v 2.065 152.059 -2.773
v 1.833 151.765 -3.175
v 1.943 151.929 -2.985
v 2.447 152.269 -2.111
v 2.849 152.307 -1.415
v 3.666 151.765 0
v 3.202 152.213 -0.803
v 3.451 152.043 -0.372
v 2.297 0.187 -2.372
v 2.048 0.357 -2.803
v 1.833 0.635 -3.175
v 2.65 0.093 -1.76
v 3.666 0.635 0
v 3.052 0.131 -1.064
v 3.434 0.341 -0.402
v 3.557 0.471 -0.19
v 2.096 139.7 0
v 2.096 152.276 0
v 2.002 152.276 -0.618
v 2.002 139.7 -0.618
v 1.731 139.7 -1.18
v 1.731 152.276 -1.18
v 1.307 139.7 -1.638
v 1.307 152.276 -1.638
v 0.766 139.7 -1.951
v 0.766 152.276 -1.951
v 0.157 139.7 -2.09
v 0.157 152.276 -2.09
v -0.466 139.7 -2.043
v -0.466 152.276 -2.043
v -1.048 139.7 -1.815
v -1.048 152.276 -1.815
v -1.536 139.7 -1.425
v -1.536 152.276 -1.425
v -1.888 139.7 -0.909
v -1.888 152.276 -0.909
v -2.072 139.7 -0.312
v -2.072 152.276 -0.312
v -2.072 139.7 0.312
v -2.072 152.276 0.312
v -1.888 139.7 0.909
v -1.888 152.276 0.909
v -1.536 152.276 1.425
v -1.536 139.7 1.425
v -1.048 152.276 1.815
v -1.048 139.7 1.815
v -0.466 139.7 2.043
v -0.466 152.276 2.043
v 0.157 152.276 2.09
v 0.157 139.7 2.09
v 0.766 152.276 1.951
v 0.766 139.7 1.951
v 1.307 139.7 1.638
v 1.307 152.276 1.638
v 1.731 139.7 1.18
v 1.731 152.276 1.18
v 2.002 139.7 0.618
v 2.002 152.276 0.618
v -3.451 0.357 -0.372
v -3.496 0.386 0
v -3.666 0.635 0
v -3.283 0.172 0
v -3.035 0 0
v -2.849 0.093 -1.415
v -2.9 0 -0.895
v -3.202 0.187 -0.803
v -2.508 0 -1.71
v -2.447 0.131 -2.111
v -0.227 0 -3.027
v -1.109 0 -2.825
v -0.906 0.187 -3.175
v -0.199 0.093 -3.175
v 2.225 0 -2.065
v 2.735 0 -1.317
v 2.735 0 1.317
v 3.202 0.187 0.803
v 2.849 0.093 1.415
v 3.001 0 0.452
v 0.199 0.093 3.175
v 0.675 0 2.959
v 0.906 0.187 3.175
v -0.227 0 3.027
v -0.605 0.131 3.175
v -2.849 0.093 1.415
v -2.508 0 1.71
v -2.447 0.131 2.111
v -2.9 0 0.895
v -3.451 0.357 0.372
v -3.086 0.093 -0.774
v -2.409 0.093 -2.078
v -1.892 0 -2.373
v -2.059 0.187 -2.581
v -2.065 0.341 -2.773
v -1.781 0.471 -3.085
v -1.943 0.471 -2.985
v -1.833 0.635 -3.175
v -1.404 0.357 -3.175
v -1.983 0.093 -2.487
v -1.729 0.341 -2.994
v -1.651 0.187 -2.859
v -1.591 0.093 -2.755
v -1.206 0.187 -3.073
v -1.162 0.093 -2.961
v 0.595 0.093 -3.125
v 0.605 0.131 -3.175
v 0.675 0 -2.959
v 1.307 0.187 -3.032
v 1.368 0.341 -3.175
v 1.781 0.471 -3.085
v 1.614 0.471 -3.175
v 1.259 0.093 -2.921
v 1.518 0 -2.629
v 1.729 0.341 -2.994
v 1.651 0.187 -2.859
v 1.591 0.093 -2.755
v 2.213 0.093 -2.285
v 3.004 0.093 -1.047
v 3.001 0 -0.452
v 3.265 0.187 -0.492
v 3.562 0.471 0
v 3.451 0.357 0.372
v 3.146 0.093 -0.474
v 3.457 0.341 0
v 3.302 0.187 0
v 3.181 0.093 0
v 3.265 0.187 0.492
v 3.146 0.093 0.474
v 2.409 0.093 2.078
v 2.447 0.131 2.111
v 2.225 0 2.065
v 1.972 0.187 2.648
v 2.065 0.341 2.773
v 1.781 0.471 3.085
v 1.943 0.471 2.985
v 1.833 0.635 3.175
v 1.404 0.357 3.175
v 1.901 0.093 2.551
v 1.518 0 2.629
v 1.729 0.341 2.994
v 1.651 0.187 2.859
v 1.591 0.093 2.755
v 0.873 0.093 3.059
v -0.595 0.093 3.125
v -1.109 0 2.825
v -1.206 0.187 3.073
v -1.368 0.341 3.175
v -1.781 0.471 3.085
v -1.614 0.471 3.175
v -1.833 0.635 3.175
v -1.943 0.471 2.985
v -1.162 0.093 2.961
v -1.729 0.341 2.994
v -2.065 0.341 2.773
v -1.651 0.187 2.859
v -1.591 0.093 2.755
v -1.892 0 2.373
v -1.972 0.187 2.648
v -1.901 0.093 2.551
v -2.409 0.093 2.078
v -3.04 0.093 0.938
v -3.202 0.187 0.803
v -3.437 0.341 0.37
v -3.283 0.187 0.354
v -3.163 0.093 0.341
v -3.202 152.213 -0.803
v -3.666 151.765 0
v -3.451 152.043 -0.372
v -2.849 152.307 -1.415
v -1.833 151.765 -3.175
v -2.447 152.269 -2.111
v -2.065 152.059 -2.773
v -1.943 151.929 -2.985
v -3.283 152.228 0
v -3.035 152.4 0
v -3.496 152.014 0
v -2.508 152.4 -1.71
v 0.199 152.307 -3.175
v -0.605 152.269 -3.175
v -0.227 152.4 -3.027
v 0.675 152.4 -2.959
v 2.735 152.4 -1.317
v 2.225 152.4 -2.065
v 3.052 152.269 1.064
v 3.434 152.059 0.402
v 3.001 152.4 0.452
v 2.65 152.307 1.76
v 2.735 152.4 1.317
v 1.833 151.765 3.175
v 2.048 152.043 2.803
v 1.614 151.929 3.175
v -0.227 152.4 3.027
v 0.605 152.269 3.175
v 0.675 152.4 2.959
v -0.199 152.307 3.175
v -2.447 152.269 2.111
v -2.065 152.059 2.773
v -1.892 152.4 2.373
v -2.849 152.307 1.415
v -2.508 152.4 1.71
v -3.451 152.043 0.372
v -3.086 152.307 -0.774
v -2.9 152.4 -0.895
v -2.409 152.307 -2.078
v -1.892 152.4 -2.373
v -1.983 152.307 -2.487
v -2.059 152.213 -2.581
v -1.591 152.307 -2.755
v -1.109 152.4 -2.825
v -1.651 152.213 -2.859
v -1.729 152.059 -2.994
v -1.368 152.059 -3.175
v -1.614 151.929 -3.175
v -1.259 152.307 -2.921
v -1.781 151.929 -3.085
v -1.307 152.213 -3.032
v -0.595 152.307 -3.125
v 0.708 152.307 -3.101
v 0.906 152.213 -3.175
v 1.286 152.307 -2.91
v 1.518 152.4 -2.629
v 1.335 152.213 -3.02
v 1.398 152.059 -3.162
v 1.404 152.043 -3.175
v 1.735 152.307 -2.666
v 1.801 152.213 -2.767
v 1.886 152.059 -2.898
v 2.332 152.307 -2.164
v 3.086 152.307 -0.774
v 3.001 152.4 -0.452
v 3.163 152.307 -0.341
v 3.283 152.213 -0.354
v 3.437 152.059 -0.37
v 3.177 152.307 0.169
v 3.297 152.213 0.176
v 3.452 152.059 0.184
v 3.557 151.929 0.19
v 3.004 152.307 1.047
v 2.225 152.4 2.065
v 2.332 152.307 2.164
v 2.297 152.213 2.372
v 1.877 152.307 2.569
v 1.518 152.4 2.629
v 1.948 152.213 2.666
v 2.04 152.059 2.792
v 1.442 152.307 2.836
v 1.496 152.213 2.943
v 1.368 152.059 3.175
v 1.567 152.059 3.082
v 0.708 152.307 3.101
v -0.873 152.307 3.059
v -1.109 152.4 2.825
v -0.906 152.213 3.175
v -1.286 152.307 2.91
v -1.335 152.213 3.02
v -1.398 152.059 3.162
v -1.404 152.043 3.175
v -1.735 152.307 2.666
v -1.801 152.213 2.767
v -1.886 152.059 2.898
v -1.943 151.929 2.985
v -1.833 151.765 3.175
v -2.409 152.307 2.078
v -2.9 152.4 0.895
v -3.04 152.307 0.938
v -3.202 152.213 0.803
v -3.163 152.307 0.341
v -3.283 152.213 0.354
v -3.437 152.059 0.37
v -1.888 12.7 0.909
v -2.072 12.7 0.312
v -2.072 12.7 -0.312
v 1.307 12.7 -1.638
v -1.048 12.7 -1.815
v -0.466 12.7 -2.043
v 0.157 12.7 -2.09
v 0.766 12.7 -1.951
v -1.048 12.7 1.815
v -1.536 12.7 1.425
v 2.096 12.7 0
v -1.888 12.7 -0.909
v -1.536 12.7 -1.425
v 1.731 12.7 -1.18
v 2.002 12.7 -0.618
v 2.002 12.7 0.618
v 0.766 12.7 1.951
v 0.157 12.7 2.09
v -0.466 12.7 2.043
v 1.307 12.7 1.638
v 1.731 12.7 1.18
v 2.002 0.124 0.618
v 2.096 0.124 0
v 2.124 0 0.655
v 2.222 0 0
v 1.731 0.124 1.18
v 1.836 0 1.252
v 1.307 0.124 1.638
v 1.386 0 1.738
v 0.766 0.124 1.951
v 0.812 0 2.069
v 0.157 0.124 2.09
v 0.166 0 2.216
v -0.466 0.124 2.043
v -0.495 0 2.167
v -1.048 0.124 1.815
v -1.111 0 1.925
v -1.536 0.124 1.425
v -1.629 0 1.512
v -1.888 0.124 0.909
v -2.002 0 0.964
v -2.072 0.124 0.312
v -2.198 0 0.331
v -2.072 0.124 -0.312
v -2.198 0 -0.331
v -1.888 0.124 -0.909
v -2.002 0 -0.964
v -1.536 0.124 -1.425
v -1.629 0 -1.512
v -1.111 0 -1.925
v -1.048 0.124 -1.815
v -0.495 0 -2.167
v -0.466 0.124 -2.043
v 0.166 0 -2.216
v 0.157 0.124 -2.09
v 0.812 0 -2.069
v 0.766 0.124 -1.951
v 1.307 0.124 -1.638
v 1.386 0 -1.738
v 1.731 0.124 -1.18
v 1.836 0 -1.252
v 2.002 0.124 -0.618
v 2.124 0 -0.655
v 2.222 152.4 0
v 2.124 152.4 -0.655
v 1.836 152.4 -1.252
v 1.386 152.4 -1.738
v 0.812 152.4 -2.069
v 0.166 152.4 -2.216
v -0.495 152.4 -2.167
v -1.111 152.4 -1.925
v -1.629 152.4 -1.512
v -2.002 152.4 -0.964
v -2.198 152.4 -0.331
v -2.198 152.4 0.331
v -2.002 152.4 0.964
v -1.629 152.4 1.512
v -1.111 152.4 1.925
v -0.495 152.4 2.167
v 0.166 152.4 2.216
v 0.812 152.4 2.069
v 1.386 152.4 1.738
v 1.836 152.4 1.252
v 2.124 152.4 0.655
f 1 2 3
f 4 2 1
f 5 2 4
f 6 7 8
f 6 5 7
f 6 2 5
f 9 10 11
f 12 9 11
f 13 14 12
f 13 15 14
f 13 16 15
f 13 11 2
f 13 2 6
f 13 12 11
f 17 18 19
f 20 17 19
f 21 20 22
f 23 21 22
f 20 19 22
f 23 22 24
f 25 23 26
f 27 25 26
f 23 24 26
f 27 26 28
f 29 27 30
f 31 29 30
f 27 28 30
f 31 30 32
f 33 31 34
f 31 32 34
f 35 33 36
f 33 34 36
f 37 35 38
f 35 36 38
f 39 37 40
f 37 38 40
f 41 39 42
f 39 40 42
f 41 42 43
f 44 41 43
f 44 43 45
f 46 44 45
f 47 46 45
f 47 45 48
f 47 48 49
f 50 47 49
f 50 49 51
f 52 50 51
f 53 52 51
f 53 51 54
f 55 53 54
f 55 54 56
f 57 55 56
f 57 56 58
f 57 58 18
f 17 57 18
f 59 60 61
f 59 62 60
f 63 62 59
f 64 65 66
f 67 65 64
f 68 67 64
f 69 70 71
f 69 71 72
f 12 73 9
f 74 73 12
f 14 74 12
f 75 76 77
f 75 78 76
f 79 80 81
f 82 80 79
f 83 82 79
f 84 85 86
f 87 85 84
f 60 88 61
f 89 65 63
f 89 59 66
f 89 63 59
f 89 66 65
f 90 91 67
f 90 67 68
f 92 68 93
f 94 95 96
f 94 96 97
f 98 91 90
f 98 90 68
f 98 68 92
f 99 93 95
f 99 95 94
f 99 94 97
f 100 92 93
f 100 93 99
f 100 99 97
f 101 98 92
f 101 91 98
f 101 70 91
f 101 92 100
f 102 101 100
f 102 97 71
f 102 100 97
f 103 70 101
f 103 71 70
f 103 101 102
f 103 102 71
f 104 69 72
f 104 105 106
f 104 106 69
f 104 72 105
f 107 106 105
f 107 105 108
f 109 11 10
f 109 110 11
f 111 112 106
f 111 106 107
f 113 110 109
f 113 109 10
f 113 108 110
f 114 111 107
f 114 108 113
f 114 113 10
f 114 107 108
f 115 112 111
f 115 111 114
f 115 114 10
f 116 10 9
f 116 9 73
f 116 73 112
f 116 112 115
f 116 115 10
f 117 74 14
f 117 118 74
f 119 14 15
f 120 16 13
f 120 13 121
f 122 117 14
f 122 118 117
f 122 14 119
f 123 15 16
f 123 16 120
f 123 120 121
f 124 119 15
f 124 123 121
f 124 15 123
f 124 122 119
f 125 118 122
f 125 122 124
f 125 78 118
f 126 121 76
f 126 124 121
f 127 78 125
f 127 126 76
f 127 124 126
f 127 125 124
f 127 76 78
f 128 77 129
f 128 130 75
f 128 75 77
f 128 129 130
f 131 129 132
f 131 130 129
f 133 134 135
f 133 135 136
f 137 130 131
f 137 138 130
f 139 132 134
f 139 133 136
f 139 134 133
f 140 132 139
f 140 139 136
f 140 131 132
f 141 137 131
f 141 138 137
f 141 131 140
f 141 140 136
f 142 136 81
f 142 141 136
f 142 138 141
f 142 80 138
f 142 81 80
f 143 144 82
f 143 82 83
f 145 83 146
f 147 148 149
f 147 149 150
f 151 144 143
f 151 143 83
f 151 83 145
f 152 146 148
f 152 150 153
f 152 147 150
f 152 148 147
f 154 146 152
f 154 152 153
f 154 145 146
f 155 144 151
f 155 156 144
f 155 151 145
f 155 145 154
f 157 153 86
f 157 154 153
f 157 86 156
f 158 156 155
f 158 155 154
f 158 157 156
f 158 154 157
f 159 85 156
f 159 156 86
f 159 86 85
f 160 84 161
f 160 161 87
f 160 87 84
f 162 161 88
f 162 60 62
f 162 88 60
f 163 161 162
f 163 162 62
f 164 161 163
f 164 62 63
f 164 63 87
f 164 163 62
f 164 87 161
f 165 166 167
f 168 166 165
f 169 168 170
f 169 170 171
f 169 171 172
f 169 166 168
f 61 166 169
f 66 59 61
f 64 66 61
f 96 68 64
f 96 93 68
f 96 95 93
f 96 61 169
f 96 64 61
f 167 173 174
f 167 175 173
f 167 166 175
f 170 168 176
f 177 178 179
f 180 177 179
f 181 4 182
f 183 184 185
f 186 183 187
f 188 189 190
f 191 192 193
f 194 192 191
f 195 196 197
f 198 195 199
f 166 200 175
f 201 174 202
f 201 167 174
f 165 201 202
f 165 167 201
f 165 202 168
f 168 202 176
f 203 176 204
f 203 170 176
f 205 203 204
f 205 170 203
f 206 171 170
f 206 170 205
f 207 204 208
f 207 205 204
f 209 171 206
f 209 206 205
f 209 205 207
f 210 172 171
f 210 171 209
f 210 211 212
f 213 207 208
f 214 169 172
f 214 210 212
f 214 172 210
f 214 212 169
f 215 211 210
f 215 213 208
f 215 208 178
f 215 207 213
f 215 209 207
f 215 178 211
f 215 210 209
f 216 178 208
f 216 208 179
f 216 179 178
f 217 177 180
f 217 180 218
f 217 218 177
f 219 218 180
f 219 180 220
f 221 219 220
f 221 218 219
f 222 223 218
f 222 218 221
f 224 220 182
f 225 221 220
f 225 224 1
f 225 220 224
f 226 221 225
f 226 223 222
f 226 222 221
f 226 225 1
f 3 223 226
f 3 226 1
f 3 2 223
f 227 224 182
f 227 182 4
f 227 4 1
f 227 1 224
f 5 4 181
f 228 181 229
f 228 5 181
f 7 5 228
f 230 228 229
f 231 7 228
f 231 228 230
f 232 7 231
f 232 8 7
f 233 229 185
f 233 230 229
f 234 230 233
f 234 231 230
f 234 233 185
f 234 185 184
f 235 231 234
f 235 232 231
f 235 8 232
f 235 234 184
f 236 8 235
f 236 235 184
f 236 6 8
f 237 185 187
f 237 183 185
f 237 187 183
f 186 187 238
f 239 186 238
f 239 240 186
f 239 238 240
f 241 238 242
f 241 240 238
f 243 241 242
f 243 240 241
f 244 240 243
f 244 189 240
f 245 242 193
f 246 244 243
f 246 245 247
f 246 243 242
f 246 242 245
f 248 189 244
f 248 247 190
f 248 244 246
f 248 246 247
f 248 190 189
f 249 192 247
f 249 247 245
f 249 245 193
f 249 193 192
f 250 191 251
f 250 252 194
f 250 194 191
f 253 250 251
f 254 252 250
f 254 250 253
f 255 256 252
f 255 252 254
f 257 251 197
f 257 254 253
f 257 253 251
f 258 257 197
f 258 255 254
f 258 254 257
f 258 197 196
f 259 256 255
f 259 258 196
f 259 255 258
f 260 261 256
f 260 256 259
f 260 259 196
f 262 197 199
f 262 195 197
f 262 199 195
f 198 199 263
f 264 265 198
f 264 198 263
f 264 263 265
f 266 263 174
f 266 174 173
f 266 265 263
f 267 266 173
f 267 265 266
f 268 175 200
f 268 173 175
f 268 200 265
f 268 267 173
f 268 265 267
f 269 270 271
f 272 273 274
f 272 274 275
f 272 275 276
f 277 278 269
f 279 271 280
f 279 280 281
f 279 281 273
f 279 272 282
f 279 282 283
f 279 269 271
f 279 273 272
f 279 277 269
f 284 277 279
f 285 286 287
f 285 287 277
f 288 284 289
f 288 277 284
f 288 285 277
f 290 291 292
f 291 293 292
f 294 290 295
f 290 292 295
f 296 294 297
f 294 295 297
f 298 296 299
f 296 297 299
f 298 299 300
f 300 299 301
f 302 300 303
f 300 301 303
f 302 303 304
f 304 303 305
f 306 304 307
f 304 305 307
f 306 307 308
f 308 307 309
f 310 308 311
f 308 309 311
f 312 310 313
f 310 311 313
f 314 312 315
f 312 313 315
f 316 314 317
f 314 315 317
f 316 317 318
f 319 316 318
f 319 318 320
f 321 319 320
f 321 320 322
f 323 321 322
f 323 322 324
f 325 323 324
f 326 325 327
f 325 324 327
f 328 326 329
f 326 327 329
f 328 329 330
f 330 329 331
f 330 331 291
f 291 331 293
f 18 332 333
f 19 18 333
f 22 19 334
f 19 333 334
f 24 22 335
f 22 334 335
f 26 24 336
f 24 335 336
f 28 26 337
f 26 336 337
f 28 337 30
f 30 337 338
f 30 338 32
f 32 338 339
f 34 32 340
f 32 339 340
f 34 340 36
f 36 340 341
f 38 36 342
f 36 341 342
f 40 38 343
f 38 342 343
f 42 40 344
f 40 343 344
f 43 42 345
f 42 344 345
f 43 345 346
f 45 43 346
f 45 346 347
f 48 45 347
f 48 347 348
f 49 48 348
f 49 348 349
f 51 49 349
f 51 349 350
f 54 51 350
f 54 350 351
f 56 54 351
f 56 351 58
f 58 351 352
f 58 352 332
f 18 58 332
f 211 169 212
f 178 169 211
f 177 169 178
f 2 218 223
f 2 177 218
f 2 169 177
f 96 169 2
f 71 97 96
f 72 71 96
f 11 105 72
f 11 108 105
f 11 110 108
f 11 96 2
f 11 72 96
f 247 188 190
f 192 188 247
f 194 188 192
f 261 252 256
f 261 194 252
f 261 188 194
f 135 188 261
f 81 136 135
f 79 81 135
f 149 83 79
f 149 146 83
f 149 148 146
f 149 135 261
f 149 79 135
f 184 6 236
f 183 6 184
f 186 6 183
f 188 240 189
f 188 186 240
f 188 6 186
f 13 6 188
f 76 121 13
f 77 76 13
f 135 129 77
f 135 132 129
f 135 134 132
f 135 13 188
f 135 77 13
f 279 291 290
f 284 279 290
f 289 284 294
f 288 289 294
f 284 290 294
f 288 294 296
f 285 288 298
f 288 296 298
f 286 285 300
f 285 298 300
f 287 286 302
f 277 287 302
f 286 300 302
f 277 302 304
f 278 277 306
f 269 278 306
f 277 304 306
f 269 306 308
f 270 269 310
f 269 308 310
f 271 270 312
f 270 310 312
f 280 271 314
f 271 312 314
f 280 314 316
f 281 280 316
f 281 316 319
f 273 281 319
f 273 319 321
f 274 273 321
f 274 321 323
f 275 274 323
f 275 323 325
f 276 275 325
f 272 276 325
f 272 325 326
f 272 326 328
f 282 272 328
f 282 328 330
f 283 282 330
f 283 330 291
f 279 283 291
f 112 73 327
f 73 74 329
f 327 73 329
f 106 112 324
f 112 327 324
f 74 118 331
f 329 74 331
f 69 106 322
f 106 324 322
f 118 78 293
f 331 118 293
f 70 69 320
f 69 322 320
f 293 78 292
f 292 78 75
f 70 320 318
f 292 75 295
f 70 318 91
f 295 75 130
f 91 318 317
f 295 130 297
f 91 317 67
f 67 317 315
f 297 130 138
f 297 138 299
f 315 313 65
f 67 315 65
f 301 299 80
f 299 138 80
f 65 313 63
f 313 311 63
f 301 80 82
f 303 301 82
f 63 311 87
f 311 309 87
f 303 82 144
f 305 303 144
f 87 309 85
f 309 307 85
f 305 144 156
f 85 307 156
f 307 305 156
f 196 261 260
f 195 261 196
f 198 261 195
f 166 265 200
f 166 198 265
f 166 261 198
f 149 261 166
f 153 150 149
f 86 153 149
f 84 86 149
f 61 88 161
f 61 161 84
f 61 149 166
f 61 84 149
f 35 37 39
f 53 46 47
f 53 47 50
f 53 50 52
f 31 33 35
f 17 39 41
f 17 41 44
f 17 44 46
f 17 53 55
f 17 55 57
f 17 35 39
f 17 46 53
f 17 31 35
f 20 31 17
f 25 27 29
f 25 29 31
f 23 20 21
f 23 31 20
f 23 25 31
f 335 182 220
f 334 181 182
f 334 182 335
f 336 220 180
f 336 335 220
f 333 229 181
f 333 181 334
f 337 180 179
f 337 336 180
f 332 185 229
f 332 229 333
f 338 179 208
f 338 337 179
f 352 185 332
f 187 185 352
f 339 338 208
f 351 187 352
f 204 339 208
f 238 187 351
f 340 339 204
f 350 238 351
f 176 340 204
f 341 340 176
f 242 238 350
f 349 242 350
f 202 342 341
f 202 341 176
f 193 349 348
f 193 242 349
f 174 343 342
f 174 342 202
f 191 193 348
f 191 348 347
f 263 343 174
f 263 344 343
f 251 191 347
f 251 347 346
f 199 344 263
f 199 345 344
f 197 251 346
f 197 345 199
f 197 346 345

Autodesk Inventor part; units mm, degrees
ref_plane "YZ Plane" through (0, 0, 0) normal (1, 0, 0) x (0, 1, 0)
ref_plane "XZ Plane" through (0, 0, 0) normal (0, 1, 0) x (-1, 0, 0)
ref_plane "XY Plane" through (0, 0, 0) normal (0, 0, 1) x (1, 0, 0)
sketch "Sketch1" plane through (0, 0, 0) normal (0, 1, 0) x (-1, 0, 0)
  line L0 (-1.8331, -3.175) -> (-3.6662, 0)
  line L1 (-3.6662, 0) -> (-1.8331, 3.175)
  line L2 (-1.8331, 3.175) -> (1.8331, 3.175)
  line L3 (1.8331, 3.175) -> (3.6662, 0)
  line L4 (3.6662, 0) -> (1.8331, -3.175)
  line L5 (1.8331, -3.175) -> (-1.8331, -3.175)
  point P0 (0, 0)
  point P1 (0, 0)
  dimension "d0" = 6.35
extrude "Body" add sketch "Sketch1" along normal blind 152.4
sketch "Sketch2" plane through (0, 152.4, 0) normal (0, 1, 0) x (1, 0, 0)
  circle A0 centre (0, 0) radius 2.0955
  dimension "d3" = 4.191
extrude "Hole 2" cut sketch "Sketch2" against normal blind 12.7
sketch "Sketch3" plane through (0, 0, 0) normal (0, -1, 0) x (1, 0, 0)
  circle A0 centre (0, 0) radius 2.0955
  dimension "d6" = 4.191
extrude "Hole 1" cut sketch "Sketch3" against normal blind 12.7
chamfer "Hole 2 Chamfer 1" distance 0.127 distance2 0.1244 1 edges at (-2.0955, 152.4, 0) measured on face at (0.0842, 152.4, 2.8101)
chamfer "Hole 1 Chamfer 1" distance 0.127 distance2 0.1244 1 edges at (-2.0955, 0, 0) measured on face at (-0.0842, 0, 2.8101)
sketch "Sketch4" plane through (0, 0, 0) normal (0, 0, 1) x (1, 0, 0)
  line L0 (1.8331, 152.4) -> (-1.8331, 152.4) projected
  line L1 (0, 152.4) -> (-3.0353, 152.4)
  line L2 (-3.6662, 152.4) -> (-1.8331, 152.4) projected
  line L3 (-3.6662, 0) -> (-3.6662, 152.4) projected
  arc A0 (-3.0353, 152.4) -> (-3.6662, 151.765) centre (-2.2234, 150.9624) ccw
  line L4 (-3.6662, 151.765) -> (-6.3588, 154.3647)
  line L5 (-6.3588, 154.3647) -> (0, 152.4)
  line L6 (0, 152.4) -> (0, -149.536)
  point P0 (0, 0)
  dimension "d15" = 3.0353
  dimension "d16" = 1.651
  dimension "d17" = 0.635
revolve "Hole 2 Chamfer 2" cut sketch "Sketch4" angle 360 about axis through (0, 152.4, 0) along (0, -1, 0)
sketch "Sketch5" plane through (0, 0, 0) normal (0, 0, 1) x (1, 0, 0)
  line L0 (0, 0) -> (-3.0353, 0)
  line L1 (1.8331, 0) -> (-1.8331, 0) projected
  line L2 (-3.6662, 0) -> (-3.6662, 152.4) projected
  arc A0 (-3.6662, 0.635) -> (-3.0353, 0) centre (-2.2234, 1.4376) ccw
  line L3 (0, 0) -> (0, -2.1986)
  line L4 (-3.6662, 0.635) -> (-4.1154, -0.8715)
  line L5 (-4.1154, -0.8715) -> (0, 0)
  point P0 (-3.6662, 151.765)
  dimension "d19" = 3.0353
  dimension "d20" = 1.651
  dimension "d21" = 0.635
revolve "Hole 1 Chamfer 2" cut sketch "Sketch5" angle 360 about axis through (0, 0, 0) along (0, -1, 0)
chamfer "Hole 2 Chamfer 1 For Short" [suppressed]
sketch "Sketch7" plane through (0, 0, 0) normal (0, 0, 1) x (1, 0, 0)
  line L0 (0.0002, 152.4004) -> (3.0355, 152.4)
  line L1 (3.6662, 152.4) -> (1.8331, 152.4) projected
  line L2 (3.6662, 0.635) -> (3.6662, 152.4) projected
  arc A0 (3.6662, 151.765) -> (3.0355, 152.4) centre (2.2233, 150.9626) ccw
  line L3 (3.6662, 151.765) -> (4.2665, 153.3032)
  line L4 (4.2665, 153.3032) -> (0.0002, 152.4004)
  line L5 (0.0002, 154.2061) -> (0.0002, 152.4004)
  line L6 (1.8331, 152.4) -> (-1.8331, 152.4) projected
  point P0 (0, 0)
  dimension "d33" = 3.0353
  dimension "d34" = 1.651
  dimension "d35" = 0.635
revolve "Hole 2 Chamfer 2 For Short" [suppressed]
properties part number "Standoff .5" material "VEX Aluminum Alloy 5052-H32"
